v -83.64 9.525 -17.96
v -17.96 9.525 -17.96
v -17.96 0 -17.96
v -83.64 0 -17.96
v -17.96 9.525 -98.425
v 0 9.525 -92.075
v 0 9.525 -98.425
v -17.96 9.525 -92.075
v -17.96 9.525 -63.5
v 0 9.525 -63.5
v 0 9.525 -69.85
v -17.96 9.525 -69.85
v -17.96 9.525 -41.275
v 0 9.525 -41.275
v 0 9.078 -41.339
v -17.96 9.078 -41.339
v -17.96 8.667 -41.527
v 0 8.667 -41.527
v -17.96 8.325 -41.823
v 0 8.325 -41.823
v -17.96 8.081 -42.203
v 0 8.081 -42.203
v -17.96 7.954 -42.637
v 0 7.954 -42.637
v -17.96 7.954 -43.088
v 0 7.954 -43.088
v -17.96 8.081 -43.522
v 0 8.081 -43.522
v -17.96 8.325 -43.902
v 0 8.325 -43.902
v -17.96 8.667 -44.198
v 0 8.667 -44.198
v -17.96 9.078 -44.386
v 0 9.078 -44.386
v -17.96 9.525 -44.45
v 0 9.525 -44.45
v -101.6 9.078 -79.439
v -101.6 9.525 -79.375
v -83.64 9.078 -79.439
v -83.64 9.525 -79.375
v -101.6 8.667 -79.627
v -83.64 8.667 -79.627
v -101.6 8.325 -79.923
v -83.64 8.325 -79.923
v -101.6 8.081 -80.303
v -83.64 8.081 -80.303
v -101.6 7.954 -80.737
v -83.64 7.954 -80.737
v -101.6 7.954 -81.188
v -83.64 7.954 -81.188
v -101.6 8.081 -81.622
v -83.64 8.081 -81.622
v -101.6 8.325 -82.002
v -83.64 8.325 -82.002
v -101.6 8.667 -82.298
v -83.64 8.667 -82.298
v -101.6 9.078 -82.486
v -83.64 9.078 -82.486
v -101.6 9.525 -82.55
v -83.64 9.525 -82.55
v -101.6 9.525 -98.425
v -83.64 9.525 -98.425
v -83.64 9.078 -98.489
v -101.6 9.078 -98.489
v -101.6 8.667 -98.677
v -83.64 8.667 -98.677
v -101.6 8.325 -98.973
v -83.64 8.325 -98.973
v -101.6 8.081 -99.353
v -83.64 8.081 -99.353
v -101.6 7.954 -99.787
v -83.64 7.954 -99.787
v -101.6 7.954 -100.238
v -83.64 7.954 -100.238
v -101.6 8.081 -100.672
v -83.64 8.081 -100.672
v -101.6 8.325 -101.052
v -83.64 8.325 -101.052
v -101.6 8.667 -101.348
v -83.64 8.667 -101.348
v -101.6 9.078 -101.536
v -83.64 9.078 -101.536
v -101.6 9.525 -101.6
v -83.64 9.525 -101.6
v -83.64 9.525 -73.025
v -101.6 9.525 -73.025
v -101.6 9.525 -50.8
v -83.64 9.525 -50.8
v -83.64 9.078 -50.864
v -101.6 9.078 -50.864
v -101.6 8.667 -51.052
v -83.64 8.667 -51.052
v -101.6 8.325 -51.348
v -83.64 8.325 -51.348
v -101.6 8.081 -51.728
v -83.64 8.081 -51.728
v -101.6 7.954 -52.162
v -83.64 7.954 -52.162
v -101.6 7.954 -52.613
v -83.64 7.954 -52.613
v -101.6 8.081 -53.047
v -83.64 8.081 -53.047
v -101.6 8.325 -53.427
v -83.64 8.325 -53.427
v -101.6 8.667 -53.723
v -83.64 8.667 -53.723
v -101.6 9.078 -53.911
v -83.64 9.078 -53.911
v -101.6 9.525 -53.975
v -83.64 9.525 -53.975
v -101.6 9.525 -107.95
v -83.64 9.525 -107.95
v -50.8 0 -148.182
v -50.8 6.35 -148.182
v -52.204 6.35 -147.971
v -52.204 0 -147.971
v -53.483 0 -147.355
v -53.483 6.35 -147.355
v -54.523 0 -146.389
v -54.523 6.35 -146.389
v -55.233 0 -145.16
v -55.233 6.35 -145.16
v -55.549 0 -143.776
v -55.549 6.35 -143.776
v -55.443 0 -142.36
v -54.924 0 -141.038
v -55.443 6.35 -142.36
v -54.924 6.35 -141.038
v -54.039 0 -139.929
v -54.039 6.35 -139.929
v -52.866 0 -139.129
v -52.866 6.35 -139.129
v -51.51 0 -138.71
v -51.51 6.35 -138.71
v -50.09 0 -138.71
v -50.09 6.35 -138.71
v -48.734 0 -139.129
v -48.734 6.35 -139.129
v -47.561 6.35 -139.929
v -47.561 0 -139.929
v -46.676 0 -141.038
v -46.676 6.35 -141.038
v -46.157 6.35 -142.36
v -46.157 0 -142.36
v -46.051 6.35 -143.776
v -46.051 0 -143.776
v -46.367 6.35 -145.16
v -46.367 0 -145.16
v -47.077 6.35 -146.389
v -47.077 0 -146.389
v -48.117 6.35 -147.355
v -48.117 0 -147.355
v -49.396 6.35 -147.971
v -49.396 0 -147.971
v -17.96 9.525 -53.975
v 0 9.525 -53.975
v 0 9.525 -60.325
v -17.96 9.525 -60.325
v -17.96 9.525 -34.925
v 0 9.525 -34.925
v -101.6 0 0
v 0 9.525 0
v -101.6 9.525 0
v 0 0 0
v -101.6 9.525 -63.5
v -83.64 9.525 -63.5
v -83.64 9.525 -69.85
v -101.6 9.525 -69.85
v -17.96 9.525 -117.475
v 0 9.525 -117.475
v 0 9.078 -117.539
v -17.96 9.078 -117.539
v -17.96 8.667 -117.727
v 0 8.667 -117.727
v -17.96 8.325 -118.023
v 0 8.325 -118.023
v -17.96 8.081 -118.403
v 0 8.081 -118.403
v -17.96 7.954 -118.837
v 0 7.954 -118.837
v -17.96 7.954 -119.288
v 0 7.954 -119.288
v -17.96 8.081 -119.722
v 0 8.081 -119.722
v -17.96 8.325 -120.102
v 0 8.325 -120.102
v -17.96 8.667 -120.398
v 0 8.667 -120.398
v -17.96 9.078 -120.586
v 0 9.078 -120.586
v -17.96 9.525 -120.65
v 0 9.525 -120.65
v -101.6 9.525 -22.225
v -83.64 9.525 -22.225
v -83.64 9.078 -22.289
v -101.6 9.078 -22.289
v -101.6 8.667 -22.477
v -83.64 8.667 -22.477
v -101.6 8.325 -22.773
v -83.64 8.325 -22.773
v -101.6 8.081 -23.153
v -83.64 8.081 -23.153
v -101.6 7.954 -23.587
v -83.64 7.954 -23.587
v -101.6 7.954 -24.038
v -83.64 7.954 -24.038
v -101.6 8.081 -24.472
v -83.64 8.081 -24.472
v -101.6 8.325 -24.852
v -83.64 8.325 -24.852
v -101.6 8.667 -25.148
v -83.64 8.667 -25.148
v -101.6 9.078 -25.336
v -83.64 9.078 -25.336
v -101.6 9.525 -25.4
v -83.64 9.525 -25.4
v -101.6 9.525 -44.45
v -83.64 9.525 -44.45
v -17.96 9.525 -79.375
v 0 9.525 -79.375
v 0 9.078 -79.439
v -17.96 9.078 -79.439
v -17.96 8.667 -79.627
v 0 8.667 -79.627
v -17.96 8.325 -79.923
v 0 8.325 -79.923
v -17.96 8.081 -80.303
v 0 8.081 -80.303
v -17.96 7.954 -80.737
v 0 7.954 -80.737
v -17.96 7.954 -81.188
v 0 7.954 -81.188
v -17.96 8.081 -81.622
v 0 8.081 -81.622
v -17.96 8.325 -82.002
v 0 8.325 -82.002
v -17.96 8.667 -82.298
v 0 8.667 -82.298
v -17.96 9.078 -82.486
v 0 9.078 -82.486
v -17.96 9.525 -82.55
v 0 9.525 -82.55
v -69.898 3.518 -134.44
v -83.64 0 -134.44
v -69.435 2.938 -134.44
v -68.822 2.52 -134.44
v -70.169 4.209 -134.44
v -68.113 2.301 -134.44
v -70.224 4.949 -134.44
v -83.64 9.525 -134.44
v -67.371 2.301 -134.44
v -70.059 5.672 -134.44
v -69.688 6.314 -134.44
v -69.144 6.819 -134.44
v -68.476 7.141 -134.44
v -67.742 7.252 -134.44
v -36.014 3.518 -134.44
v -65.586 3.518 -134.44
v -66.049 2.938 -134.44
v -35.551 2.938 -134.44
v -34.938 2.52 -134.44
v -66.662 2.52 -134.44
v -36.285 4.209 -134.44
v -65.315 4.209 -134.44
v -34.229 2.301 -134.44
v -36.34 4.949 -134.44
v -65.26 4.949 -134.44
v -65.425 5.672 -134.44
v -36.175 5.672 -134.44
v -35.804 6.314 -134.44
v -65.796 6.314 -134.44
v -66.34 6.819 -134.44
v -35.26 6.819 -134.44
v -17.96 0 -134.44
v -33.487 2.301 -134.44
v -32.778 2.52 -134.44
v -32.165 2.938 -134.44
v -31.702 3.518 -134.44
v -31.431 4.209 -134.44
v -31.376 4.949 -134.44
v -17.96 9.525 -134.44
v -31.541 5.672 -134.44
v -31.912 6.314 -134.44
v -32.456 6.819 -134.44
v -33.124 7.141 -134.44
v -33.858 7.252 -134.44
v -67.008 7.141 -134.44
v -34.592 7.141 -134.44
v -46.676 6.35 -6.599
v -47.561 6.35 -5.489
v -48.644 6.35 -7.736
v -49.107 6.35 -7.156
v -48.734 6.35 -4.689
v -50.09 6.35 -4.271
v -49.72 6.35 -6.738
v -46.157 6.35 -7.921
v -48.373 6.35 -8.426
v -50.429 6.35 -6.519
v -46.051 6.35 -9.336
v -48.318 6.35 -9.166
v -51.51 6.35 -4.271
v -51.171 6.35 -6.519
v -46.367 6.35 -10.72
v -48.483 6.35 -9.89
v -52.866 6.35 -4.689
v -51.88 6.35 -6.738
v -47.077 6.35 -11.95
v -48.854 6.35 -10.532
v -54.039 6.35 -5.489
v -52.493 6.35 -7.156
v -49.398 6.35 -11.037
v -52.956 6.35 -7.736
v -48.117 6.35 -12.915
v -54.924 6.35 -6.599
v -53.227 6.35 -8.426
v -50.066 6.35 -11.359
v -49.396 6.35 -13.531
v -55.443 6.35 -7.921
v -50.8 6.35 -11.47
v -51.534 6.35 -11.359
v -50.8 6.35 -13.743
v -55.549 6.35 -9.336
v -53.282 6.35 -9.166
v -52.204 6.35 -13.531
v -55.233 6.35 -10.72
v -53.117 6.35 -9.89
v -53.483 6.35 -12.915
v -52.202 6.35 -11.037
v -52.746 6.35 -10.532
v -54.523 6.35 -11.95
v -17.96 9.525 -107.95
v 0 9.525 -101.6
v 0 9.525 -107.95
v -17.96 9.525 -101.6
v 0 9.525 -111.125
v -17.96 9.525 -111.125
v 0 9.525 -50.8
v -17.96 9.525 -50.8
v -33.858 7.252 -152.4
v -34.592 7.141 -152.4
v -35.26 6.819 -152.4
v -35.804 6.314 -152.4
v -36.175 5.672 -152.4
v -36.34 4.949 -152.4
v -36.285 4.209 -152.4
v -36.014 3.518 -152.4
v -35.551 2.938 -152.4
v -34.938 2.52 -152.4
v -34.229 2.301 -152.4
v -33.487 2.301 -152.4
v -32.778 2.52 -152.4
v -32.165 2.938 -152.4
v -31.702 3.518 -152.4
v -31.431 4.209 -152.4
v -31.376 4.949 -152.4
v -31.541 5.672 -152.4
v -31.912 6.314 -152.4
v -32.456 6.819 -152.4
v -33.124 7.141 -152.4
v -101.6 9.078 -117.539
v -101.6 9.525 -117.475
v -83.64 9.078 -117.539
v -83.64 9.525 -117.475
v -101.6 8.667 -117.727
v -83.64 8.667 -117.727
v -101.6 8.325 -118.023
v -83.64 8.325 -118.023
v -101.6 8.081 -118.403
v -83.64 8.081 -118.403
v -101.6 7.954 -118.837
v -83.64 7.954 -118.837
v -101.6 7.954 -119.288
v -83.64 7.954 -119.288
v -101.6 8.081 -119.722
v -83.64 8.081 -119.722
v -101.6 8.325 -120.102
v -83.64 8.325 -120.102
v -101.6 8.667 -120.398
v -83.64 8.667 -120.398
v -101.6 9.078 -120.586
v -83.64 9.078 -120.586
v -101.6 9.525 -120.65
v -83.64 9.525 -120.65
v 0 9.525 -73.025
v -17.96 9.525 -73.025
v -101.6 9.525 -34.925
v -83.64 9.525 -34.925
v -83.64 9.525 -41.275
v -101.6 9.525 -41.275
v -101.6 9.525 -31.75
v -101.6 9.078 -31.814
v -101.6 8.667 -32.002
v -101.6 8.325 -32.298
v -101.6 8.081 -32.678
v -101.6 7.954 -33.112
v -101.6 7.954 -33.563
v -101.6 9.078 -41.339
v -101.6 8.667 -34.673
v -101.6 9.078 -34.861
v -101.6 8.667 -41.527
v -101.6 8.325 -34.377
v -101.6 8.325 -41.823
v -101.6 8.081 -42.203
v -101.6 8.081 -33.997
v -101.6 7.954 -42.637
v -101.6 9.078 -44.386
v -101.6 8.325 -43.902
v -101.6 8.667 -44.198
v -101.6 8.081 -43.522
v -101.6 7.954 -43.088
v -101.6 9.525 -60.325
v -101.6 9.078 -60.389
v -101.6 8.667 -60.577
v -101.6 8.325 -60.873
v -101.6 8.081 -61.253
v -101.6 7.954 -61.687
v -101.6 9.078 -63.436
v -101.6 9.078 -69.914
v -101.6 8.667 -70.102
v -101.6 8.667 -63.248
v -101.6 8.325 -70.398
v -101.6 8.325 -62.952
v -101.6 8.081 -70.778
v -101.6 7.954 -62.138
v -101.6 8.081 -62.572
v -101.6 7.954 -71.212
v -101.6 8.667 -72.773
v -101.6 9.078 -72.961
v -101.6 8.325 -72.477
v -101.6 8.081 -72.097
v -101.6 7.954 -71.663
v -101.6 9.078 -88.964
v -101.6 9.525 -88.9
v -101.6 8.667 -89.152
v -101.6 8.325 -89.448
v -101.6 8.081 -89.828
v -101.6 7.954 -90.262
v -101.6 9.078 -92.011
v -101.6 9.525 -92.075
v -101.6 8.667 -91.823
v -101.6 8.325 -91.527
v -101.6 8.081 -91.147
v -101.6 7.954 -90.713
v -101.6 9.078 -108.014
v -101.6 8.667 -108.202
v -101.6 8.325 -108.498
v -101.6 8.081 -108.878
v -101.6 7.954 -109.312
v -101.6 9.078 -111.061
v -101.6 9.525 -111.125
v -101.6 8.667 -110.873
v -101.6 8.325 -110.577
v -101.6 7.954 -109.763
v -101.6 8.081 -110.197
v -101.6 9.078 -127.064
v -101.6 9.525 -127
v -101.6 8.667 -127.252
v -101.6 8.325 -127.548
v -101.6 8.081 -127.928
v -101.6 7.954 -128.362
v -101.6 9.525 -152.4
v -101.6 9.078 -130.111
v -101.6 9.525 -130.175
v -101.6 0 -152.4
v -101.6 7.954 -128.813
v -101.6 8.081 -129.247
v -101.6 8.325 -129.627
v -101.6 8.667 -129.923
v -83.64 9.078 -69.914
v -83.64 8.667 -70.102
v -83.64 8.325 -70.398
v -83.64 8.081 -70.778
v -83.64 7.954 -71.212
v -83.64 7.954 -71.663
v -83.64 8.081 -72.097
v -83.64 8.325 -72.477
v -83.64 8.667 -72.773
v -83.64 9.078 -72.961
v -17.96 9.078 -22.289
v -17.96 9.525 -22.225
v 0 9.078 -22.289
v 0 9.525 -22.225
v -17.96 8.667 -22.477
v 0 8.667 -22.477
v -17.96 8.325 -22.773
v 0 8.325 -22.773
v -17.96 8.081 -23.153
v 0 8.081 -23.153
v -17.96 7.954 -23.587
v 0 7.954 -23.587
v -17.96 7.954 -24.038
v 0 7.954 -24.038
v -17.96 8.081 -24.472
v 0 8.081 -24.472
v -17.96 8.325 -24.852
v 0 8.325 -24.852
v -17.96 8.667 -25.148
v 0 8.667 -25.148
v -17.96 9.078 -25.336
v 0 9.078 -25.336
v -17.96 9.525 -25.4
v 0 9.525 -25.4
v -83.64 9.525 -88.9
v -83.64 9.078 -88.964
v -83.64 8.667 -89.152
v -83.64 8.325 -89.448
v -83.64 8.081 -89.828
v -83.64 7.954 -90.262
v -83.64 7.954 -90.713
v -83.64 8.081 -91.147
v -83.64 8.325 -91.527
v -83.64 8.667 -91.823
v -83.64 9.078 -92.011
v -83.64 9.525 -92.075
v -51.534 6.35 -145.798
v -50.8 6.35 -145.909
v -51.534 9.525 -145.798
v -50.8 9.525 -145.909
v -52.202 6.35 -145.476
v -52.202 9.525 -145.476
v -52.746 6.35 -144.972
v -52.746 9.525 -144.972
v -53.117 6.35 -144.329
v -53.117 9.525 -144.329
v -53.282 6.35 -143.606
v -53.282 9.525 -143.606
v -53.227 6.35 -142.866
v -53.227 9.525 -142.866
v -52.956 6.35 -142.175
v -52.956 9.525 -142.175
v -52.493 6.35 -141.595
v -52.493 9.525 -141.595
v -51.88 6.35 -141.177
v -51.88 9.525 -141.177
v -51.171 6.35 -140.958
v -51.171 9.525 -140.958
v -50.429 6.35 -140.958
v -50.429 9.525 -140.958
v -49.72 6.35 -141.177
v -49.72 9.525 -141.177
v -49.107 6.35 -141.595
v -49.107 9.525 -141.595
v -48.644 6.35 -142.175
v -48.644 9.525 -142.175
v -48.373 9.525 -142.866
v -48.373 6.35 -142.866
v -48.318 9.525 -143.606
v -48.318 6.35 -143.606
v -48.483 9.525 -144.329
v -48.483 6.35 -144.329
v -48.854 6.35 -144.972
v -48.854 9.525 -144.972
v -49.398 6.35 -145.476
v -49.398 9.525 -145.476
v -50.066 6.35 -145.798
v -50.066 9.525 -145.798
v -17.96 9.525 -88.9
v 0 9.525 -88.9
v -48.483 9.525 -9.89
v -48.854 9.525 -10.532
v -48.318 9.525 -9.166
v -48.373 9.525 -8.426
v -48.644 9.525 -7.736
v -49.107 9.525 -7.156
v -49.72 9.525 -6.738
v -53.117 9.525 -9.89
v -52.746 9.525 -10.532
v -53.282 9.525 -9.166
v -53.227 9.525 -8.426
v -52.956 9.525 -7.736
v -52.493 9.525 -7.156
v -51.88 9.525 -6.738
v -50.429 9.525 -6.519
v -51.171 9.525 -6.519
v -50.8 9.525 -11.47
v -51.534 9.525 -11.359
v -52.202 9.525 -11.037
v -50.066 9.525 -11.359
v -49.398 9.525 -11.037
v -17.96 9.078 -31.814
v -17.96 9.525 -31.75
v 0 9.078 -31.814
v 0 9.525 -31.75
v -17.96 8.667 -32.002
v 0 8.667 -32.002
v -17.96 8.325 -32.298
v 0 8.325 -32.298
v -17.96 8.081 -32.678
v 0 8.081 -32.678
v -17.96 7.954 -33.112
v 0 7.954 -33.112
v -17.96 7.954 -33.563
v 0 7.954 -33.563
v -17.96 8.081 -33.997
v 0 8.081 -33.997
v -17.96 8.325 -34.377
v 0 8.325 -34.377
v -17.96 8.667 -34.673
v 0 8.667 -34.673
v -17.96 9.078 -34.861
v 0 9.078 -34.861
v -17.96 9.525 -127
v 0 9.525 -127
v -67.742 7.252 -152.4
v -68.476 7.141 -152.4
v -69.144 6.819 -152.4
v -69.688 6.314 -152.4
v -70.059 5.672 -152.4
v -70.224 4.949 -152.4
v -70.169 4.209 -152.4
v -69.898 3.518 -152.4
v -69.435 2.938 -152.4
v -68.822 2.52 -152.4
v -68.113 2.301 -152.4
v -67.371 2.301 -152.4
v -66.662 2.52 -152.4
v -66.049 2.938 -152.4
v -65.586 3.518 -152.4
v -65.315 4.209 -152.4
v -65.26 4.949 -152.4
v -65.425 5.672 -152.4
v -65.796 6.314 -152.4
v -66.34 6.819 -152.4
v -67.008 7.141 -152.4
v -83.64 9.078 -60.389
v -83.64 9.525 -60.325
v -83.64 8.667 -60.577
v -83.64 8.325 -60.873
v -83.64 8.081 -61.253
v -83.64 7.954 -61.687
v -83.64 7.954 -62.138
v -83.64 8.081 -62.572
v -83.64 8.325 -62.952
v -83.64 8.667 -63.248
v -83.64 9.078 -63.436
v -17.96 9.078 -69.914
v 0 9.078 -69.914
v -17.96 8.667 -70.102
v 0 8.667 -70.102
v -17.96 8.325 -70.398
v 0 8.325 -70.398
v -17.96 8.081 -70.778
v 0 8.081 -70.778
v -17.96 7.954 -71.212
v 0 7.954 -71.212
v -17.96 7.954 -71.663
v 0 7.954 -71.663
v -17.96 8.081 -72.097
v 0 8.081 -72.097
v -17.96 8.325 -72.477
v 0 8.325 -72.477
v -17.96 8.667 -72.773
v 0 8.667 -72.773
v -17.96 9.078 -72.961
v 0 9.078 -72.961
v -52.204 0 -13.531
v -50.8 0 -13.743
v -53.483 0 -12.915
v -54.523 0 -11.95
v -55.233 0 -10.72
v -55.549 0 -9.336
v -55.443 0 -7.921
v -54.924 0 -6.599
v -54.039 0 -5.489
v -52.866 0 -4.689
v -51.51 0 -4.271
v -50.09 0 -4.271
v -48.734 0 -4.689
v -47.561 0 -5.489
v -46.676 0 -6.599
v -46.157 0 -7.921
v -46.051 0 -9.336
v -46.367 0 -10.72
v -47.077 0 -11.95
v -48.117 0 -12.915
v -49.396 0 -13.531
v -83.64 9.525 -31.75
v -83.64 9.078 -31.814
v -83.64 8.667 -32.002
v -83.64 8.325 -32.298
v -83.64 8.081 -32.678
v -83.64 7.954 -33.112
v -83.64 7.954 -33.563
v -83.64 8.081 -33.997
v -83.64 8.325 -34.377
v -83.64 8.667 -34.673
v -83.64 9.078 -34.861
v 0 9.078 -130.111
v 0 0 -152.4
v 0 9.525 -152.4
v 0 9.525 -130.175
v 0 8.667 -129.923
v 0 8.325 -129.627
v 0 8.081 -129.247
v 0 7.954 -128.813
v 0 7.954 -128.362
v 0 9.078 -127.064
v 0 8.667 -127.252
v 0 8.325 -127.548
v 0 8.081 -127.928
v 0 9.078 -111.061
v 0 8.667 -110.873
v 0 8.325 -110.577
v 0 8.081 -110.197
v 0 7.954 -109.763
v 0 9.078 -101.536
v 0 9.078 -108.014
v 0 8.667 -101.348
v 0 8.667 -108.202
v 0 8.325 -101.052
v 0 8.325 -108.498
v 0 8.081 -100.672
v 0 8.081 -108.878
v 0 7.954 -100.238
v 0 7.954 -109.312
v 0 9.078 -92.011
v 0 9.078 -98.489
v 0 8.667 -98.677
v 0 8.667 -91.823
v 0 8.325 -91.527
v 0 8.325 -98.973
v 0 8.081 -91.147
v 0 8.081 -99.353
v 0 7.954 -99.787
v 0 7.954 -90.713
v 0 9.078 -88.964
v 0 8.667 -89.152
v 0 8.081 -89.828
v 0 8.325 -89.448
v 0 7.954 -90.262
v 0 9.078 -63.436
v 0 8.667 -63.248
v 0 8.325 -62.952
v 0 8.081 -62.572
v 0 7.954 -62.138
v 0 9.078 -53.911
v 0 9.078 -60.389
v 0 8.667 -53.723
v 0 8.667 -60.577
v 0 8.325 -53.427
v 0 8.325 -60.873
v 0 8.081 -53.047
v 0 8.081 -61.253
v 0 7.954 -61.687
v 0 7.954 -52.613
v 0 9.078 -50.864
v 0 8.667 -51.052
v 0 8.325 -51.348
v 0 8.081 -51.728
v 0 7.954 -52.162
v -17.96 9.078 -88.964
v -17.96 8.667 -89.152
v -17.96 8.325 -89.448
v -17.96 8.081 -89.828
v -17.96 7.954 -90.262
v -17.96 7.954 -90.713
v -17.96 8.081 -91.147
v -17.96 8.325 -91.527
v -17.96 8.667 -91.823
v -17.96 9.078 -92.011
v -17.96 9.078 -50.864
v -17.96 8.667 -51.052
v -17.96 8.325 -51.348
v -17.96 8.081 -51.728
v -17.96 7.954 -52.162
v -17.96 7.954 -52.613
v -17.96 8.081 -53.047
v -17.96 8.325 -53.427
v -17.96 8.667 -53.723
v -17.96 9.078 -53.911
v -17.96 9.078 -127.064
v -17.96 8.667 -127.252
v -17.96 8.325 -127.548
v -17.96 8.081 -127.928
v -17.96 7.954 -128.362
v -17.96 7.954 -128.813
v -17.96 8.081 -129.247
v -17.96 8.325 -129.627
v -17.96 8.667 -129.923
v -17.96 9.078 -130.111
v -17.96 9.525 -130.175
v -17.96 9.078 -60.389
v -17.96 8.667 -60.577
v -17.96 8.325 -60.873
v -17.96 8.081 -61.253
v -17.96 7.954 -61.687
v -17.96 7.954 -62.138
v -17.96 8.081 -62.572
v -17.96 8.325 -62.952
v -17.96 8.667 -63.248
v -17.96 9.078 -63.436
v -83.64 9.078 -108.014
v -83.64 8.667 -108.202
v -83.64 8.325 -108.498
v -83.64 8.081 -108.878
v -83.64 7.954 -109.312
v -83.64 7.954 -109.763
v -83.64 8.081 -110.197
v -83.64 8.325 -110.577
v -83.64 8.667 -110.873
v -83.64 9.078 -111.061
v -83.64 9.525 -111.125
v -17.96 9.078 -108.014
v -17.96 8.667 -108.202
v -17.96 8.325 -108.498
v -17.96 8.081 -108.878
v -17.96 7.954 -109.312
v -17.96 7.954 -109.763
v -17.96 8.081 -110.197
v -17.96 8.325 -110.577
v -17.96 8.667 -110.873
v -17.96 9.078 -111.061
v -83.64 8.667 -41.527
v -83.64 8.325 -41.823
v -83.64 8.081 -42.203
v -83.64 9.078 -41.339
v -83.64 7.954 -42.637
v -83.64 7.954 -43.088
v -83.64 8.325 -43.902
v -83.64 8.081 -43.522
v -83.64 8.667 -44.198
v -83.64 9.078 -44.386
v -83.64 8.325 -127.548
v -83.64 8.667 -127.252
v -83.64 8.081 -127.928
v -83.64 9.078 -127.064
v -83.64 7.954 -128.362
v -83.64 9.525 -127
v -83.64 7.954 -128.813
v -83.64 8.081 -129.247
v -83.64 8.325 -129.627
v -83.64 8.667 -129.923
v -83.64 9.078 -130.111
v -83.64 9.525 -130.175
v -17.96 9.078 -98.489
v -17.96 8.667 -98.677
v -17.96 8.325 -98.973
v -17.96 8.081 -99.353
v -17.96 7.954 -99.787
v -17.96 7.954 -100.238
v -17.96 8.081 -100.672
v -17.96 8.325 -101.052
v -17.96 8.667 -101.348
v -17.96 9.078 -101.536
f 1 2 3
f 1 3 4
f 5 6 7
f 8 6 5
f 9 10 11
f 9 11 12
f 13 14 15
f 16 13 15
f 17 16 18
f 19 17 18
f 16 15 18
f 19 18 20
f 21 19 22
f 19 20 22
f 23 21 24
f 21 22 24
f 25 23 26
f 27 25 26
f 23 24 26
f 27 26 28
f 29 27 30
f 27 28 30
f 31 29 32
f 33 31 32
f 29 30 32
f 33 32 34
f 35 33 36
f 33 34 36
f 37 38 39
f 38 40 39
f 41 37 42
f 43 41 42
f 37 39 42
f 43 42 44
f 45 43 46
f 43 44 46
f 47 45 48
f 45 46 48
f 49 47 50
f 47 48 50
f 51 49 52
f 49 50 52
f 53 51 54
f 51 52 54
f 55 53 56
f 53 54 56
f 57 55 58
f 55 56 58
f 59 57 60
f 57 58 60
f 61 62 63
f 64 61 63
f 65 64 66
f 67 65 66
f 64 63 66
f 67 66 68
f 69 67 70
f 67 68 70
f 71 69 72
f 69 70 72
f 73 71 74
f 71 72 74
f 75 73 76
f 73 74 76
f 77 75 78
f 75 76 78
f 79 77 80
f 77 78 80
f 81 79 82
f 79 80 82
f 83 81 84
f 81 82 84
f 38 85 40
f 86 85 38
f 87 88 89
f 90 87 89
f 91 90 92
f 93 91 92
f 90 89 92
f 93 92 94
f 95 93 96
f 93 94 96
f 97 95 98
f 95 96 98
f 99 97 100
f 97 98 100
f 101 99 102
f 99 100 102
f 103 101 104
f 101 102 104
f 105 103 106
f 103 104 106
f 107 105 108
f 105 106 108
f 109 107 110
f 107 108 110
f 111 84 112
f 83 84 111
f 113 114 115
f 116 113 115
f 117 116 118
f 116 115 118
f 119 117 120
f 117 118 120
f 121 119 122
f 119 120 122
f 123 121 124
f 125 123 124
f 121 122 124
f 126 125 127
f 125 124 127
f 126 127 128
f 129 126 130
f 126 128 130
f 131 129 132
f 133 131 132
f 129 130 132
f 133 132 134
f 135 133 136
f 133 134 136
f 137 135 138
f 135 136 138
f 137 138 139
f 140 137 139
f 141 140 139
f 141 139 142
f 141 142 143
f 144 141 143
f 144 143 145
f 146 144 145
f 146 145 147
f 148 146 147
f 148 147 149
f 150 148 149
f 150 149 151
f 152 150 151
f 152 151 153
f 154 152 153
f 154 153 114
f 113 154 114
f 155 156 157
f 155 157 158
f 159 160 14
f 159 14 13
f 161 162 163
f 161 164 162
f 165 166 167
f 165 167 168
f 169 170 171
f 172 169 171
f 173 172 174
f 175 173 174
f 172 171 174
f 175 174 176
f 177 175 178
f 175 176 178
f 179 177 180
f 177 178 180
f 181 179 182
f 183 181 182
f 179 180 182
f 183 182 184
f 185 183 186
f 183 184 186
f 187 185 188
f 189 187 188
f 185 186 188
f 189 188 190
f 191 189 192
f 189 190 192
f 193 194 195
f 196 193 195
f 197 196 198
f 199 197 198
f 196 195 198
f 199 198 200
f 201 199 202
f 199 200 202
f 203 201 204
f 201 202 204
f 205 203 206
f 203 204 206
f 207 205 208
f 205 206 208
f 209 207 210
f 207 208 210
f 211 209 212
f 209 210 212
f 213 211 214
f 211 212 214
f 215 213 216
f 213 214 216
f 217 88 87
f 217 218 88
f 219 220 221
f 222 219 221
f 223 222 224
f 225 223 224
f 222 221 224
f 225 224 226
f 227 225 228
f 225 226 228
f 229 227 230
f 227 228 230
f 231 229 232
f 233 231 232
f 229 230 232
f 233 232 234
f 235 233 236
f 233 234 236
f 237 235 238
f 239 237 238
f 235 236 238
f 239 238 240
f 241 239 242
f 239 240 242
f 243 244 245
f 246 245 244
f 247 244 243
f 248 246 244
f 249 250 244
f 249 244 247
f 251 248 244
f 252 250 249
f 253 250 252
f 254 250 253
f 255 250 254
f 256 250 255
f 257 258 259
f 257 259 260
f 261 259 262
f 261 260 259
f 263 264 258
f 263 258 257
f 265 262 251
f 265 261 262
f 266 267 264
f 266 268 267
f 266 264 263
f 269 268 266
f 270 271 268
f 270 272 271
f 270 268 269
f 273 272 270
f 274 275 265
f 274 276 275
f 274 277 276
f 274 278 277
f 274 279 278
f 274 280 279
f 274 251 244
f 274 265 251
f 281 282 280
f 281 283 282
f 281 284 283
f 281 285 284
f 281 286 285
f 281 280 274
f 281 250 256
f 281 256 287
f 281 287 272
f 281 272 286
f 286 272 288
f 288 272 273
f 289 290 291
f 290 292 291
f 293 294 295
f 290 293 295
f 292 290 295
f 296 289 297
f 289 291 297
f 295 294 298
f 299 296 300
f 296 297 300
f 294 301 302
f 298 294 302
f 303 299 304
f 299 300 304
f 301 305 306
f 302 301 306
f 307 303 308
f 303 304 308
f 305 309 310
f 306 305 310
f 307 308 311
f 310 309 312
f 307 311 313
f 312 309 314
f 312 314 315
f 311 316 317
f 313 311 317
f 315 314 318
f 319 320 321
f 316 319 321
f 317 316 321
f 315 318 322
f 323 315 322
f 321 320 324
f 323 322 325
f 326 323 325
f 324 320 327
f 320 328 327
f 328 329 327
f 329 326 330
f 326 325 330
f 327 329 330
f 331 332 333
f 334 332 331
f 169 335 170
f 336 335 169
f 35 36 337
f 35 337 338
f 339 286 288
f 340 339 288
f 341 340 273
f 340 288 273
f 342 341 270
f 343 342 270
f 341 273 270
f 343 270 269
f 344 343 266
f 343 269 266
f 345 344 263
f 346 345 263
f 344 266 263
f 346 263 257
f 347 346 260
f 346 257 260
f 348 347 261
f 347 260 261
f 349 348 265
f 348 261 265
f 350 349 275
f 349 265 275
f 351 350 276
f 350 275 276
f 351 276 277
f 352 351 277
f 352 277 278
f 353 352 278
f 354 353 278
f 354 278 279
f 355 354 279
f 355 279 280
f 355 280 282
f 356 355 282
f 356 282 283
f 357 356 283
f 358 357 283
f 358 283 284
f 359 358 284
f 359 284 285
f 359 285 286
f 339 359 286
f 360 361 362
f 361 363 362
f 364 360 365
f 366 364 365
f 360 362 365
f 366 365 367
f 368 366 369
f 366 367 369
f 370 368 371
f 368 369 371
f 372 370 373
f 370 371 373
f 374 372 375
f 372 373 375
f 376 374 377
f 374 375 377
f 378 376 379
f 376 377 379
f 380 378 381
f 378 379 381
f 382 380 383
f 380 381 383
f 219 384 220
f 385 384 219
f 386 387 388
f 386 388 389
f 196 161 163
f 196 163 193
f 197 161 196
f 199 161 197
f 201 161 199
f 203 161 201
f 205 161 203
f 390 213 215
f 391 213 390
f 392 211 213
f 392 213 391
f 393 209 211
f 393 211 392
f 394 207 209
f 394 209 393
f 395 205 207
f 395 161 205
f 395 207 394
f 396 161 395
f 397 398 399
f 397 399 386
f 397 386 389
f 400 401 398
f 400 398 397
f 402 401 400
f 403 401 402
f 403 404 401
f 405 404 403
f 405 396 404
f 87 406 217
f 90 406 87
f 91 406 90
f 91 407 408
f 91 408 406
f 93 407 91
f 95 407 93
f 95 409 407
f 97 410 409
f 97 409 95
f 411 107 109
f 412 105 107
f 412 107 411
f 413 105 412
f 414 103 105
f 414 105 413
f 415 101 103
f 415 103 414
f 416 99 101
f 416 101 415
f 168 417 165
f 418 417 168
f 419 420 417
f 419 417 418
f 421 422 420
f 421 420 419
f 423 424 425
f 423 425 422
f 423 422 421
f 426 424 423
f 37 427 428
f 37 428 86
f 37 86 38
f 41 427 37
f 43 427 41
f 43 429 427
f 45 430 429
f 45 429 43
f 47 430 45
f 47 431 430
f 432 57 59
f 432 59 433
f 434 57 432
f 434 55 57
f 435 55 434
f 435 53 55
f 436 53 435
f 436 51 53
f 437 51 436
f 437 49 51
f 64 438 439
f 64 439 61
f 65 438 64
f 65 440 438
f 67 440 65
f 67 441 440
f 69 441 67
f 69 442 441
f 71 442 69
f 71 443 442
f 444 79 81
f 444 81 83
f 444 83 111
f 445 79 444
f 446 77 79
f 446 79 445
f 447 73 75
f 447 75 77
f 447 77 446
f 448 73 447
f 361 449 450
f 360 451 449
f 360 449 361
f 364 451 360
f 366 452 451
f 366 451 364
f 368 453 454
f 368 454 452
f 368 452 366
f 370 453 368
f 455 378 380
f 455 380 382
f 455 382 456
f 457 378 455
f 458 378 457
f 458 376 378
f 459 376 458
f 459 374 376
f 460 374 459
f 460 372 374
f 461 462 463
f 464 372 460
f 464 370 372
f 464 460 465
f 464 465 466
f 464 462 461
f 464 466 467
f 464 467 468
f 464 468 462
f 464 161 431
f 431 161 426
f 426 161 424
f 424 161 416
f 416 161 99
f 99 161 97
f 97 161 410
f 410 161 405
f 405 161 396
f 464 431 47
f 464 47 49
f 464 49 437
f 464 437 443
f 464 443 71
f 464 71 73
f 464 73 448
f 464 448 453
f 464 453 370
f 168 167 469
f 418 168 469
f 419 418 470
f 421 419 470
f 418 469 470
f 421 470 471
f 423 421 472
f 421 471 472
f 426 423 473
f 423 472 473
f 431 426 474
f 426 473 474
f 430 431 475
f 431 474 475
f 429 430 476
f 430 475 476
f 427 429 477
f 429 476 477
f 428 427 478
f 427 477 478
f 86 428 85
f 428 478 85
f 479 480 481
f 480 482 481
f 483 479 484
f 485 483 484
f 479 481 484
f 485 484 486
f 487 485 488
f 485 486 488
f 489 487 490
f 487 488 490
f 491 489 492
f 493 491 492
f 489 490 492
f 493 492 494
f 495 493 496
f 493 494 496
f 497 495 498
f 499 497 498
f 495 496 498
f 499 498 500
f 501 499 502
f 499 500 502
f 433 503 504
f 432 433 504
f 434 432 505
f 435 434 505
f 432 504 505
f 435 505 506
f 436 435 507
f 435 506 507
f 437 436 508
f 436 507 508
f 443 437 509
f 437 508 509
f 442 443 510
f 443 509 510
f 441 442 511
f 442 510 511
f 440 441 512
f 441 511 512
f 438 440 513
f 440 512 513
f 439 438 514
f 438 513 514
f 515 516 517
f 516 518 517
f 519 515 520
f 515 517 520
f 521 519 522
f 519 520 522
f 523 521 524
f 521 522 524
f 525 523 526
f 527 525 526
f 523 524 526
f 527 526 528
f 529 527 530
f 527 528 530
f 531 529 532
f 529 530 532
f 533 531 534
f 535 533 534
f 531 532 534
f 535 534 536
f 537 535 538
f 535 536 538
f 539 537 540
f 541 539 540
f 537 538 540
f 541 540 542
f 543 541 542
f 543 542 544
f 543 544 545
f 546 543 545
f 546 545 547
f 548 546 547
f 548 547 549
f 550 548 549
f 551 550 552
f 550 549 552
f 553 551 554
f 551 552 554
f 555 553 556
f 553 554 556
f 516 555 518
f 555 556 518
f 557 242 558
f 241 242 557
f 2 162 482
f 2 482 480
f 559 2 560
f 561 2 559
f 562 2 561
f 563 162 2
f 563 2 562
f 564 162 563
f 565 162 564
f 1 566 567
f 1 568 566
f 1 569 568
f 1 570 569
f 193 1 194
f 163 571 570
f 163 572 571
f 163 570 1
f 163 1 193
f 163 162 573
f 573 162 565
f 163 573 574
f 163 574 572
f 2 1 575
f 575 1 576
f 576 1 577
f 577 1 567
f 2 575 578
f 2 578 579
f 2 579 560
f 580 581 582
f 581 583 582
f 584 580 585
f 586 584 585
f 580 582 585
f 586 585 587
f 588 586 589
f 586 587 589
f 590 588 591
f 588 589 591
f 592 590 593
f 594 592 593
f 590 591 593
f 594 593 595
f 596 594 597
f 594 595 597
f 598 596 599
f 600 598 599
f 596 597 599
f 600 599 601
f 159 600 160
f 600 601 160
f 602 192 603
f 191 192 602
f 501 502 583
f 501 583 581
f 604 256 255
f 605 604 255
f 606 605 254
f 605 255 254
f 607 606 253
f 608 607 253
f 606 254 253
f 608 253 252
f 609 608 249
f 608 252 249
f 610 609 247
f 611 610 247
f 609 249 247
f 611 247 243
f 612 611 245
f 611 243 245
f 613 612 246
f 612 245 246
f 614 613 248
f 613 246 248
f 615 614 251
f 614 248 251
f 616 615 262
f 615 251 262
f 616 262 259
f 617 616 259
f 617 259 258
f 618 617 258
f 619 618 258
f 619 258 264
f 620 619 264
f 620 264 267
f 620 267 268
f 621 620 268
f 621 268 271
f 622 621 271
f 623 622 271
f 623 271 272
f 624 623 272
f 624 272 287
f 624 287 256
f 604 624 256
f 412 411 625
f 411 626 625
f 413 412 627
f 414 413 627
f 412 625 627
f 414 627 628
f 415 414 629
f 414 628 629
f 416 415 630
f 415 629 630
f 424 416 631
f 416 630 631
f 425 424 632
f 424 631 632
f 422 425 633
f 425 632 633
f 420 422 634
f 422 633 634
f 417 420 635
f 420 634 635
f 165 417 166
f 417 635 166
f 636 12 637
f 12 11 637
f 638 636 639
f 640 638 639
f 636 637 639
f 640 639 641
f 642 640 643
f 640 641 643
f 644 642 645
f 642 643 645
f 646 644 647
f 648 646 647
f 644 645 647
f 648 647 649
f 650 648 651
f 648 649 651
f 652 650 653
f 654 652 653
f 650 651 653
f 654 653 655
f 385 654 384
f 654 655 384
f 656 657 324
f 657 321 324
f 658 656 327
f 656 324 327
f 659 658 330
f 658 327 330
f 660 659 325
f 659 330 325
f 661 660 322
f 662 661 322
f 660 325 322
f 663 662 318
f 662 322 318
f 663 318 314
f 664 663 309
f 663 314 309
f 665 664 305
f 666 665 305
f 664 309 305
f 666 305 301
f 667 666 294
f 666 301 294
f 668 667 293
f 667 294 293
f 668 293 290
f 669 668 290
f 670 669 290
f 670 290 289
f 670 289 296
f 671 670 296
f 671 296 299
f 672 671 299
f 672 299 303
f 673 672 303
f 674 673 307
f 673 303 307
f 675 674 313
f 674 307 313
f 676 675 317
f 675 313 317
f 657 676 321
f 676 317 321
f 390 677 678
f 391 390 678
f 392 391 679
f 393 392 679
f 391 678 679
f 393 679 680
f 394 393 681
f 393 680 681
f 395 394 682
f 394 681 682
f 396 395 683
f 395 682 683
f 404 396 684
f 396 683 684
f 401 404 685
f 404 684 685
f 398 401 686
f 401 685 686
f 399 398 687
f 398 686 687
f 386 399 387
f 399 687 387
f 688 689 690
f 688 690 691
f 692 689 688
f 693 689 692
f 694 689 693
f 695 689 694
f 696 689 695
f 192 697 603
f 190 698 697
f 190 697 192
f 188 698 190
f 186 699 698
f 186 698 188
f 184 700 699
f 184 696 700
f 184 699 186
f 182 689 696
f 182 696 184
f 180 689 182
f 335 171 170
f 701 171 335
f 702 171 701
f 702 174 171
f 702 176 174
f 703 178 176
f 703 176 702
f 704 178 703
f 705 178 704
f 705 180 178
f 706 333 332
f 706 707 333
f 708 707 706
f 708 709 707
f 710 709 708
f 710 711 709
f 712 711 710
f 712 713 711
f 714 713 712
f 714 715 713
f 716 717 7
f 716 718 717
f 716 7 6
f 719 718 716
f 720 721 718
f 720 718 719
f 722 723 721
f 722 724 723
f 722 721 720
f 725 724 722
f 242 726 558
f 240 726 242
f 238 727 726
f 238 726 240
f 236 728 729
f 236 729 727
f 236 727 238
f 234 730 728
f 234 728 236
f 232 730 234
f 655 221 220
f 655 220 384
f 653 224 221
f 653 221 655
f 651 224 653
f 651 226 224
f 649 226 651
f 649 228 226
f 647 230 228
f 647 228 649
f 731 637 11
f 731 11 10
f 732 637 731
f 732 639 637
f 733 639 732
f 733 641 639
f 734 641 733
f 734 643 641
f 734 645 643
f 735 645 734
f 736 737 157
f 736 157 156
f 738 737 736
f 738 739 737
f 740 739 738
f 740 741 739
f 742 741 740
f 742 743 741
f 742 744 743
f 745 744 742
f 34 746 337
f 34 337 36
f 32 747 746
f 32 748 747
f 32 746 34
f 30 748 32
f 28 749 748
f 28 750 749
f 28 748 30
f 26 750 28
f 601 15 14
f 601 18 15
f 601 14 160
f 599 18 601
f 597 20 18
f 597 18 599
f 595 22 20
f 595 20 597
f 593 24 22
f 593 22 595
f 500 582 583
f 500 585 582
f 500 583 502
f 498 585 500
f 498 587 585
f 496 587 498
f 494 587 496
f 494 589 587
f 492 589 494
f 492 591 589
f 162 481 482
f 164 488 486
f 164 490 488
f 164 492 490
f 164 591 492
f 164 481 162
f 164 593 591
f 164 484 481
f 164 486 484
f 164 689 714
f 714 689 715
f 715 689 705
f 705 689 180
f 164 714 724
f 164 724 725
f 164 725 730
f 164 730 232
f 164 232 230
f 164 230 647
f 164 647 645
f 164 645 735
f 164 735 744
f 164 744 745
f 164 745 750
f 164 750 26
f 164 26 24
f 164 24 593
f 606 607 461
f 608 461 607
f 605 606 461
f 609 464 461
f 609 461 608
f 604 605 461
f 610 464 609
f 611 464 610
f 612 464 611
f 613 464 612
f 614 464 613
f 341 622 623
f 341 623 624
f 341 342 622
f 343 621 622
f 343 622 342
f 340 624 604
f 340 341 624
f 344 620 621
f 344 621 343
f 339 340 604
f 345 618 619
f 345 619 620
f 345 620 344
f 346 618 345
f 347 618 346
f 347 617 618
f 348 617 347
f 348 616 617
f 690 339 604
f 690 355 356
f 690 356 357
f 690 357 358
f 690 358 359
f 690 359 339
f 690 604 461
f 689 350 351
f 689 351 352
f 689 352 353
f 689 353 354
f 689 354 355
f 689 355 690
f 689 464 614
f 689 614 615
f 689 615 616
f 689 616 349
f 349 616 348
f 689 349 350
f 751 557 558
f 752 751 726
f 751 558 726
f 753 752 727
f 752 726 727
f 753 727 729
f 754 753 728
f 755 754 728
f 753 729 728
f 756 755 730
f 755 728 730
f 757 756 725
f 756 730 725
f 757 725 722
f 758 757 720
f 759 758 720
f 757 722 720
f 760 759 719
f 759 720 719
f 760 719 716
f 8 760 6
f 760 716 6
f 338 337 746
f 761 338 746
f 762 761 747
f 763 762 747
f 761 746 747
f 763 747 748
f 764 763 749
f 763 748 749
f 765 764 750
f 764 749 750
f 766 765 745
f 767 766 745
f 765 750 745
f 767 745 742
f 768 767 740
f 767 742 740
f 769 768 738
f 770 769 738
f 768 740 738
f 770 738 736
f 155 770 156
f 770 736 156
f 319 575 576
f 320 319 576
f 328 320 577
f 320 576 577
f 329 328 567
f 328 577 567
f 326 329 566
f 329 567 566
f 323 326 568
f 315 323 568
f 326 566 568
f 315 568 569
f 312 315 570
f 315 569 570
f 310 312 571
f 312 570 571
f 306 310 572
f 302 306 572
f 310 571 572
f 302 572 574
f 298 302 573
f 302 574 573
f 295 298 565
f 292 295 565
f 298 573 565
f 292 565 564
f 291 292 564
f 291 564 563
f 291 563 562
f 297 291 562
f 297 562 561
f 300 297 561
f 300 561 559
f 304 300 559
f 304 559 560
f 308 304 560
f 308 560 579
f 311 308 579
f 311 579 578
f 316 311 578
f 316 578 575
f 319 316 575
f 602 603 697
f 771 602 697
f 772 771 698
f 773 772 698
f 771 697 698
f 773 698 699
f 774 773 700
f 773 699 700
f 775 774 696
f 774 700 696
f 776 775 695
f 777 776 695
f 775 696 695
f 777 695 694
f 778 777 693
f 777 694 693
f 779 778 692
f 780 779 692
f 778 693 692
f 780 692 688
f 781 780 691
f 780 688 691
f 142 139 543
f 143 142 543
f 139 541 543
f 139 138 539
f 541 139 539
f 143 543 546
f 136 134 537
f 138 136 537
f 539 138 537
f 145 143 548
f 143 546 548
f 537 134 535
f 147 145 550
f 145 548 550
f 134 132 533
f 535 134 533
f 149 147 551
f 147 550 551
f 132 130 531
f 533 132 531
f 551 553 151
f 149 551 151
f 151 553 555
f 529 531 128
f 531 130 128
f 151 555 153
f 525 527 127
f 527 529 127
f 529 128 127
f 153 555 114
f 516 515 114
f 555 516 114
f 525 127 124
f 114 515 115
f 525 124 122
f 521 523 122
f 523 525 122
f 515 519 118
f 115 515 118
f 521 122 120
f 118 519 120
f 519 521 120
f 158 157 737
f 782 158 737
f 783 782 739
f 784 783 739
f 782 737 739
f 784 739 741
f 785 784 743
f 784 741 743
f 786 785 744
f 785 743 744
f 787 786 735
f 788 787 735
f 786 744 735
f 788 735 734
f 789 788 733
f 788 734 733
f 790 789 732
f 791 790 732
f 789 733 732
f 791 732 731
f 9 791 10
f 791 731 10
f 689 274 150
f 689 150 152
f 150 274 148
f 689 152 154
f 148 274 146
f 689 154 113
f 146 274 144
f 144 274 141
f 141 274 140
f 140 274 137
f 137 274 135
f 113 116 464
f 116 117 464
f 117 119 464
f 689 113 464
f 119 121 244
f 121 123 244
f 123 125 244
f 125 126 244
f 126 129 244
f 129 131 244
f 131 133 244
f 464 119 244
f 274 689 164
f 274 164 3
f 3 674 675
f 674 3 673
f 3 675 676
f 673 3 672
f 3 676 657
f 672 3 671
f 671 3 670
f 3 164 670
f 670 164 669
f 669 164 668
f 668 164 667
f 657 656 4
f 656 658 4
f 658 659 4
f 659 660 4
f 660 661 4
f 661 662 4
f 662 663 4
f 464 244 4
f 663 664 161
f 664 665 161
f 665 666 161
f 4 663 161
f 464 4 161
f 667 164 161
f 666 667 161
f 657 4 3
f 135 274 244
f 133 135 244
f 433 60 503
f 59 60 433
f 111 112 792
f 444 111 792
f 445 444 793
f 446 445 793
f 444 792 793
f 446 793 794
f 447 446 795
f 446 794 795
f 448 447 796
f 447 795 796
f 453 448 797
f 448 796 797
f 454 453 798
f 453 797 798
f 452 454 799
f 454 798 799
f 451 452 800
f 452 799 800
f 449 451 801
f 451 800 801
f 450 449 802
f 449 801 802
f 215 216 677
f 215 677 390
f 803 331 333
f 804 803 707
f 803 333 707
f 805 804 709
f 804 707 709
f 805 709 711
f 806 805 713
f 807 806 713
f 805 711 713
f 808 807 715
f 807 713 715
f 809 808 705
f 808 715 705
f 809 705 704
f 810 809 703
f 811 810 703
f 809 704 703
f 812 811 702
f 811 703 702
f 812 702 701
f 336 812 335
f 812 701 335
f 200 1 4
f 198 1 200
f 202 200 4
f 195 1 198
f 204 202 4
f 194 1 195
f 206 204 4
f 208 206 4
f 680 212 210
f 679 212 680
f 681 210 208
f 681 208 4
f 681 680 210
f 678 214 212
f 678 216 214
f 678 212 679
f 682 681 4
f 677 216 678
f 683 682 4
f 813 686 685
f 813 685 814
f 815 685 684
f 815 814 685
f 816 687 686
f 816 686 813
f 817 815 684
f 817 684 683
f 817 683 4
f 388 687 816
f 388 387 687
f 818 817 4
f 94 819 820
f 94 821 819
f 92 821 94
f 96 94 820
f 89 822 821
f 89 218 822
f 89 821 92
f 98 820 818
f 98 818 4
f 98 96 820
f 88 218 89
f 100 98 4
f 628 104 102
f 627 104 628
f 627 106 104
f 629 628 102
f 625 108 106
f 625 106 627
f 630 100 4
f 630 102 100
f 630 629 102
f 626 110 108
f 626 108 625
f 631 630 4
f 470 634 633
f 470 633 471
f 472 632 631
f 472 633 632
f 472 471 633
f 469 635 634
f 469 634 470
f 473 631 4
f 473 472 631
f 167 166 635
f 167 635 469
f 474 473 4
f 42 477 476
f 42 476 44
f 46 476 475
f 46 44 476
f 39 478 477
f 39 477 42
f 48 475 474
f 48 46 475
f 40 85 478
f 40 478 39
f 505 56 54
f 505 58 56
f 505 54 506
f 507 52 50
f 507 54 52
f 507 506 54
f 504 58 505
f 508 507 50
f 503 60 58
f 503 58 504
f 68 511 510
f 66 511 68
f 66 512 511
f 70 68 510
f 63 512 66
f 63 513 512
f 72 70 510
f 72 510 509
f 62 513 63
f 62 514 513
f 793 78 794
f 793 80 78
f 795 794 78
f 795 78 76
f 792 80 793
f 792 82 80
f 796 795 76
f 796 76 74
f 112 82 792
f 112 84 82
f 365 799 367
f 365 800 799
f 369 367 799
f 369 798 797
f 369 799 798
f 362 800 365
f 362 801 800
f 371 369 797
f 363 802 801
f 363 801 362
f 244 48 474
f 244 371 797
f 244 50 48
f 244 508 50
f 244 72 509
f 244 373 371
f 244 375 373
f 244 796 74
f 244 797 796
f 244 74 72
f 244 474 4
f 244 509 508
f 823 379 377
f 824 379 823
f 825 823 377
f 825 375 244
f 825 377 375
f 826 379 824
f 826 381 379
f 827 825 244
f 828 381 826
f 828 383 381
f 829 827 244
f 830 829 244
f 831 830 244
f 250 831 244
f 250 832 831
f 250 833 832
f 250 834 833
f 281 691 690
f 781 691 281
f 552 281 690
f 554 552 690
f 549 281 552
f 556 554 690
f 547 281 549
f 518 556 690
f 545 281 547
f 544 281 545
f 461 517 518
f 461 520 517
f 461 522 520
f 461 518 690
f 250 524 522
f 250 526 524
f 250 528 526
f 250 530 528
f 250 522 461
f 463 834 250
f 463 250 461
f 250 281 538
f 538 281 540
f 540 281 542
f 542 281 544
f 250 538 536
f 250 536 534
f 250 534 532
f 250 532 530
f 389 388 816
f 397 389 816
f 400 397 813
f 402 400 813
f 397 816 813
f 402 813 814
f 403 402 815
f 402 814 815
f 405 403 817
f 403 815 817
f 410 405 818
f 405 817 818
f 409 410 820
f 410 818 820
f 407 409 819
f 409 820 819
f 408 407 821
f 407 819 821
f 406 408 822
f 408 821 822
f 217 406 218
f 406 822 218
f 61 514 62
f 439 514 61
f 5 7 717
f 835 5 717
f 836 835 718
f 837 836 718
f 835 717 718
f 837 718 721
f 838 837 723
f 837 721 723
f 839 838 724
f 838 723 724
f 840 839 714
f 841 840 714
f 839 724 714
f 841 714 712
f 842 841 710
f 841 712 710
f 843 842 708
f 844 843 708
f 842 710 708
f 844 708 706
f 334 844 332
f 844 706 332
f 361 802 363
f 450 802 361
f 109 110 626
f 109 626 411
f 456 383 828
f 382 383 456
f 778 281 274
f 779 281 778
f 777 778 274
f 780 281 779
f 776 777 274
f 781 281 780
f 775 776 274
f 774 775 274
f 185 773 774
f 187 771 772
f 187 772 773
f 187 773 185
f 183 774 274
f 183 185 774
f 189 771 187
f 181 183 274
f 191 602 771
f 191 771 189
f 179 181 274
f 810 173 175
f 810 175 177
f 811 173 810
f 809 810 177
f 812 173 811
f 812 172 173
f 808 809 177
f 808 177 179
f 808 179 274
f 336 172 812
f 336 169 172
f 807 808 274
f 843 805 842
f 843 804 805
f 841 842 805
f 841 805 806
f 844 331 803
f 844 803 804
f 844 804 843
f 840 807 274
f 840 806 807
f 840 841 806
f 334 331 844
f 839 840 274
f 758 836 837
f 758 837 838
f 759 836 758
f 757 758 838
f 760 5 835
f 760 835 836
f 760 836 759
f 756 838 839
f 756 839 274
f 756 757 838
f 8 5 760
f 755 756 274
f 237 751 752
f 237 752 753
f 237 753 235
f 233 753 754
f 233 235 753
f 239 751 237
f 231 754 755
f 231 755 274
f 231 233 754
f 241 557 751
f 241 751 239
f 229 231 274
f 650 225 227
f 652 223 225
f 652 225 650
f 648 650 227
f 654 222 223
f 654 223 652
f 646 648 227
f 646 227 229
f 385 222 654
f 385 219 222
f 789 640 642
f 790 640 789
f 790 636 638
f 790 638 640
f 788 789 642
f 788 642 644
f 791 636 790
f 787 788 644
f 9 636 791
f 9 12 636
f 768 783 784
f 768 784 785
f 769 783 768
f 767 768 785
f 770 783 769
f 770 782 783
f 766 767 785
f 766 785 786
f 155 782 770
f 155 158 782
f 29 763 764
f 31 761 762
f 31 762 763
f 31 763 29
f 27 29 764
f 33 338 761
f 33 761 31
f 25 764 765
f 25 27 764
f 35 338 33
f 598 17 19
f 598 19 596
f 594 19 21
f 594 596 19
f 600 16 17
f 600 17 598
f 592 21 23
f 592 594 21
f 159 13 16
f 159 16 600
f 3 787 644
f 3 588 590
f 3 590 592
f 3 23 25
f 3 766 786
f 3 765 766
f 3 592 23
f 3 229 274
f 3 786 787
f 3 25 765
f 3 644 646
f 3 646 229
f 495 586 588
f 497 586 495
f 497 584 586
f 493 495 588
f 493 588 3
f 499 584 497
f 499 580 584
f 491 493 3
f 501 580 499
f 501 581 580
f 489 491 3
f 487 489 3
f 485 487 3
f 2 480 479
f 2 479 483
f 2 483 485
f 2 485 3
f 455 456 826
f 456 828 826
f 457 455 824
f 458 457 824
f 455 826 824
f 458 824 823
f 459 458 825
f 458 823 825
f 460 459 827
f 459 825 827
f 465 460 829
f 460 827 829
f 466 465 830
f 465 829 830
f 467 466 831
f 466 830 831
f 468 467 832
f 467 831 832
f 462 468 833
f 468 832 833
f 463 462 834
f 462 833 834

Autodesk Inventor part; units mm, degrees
ref_plane "YZ Plane" through (0, 0, 0) normal (1, 0, 0) x (0, 1, 0)
ref_plane "XZ Plane" through (0, 0, 0) normal (0, 1, 0) x (-1, 0, 0)
ref_plane "XY Plane" through (0, 0, 0) normal (0, 0, 1) x (1, 0, 0)
sketch "Sketch1" plane through (0, 0, 0) normal (0, 1, 0) x (-1, 0, 0)
  line L0 (0, 0) -> (101.6, 0)
  line L1 (101.6, 0) -> (101.6, -152.4)
  line L2 (101.6, -152.4) -> (0, -152.4)
  line L3 (0, -152.4) -> (0, 0)
  dimension "d0" = 101.6
  dimension "d1" = 152.4
extrude "Extrusion1" add sketch "Sketch1" along normal blind 9.525
sketch "Sketch2" plane through (0, 9.525, 0) normal (0, 1, 0) x (1, 0, 0)
  line L0 (-101.6, 0) -> (0, 0) projected
  line L1 (0, 0) -> (-17.9605, 17.9605)
  line L2 (0, 0) -> (25.4, 0) construction
  line L3 (-101.6, 152.4) -> (-101.6, 0) projected
  line L4 (-101.6, 152.4) -> (-83.6395, 134.4395)
  line L5 (-17.9605, 17.9605) -> (-83.6395, 17.9605)
  line L6 (-83.6395, 17.9605) -> (-83.6395, 134.4395)
  line L7 (-83.6395, 134.4395) -> (-17.9605, 134.4395)
  line L8 (-17.9605, 134.4395) -> (-17.9605, 17.9605)
  dimension "d4" = 25.4
  dimension "d5" = 135
  dimension "d6" = 25.4
extrude "Extrusion2" cut sketch "Sketch2" against normal blind 9.525 contours L5 L6 L7 L8
sketch "Sketch3" plane through (0, 0, 0) normal (1, 0, 0) x (0, 0, -1)
  line L0 (0, 9.525) -> (152.4, 9.525) projected
  line L1 (0, 10.079) -> (25.4, 10.079) construction
  line L2 (0, 0) -> (0, 9.525) projected
  line L3 (0, 9.525) -> (23.8125, 9.525)
  line L4 (134.4395, 9.525) -> (17.9605, 9.525) projected
  circle A0 centre (23.8125, 9.525) radius 1.5875
  circle A1 centre (33.3375, 9.525) radius 1.5875
  circle A2 centre (42.8625, 9.525) radius 1.5875
  circle A3 centre (52.3875, 9.525) radius 1.5875
  circle A4 centre (61.9125, 9.525) radius 1.5875
  circle A5 centre (71.4375, 9.525) radius 1.5875
  circle A6 centre (80.9625, 9.525) radius 1.5875
  circle A7 centre (90.4875, 9.525) radius 1.5875
  circle A8 centre (100.0125, 9.525) radius 1.5875
  circle A9 centre (109.5375, 9.525) radius 1.5875
  circle A10 centre (119.0625, 9.525) radius 1.5875
  circle A11 centre (128.5875, 9.525) radius 1.5875
  point P0 (130.175, 9.525)
  point P1 (127, 9.525)
  point P2 (120.65, 9.525)
  point P3 (117.475, 9.525)
  point P4 (101.6, 9.525)
  point P5 (98.425, 9.525)
  point P6 (82.55, 9.525)
  point P7 (79.375, 9.525)
  point P8 (73.025, 9.525)
  point P9 (69.85, 9.525)
  point P10 (63.5, 9.525)
  point P11 (60.325, 9.525)
  point P12 (53.975, 9.525)
  point P13 (50.8, 9.525)
  point P14 (44.45, 9.525)
  point P15 (41.275, 9.525)
  point P16 (34.925, 9.525)
  point P17 (31.75, 9.525)
  point P18 (22.225, 9.525)
  point P19 (25.4, 9.525)
  dimension "d11" = 23.8125
  dimension "d12" = 3.175
  dimension "d15" = 9.525
extrude "Extrusion3" cut sketch "Sketch3" against normal blind 107.95 contours L0 A0 | L0 A11 | L0 A10 | A9 L0 | L0 A9 | L0 A8 | A7 L0 | L0 A7 | L0 A6 | L0 A5 | L0 A4 | L0 A3 | L0 A2 | L0 A1 picked at (24.8555, 9.3984) picked at (128.9035, 8.9629) picked at (119.4808, 8.612) picked at (100.4308, 8.612) picked at (81.3808, 8.612) picked at (71.8558, 8.612) picked at (61.501, 9.0475) picked at (52.5145, 8.7843) picked at (42.9895, 8.7843) picked at (33.5251, 8.5384)
sketch "Sketch4" plane through (0, 0, -152.4) normal (0, 0, -1) x (-1, 0, 0)
  line L0 (101.6, 0) -> (101.6, 9.525) projected
  line L1 (101.6, 4.7625) -> (67.7418, 4.7625)
  line L2 (0, 4.7625) -> (33.8582, 4.7625)
  line L3 (0, 4.7625) -> (33.8582, 4.7625) construction
  point P0 (0, 0)
  dimension "d22" = 33.8582
  dimension "d23" = 33.8582
  dimension "d24" = 0
hole "Hole1" at (-67.7418, 4.7625, -152.4) direction (0, 0, 1) diameter 4.9784 depth 25.4 thread size "1/4-20 UNC" class "2B" standard "ANSI Unified Screw Threads"
hole "Hole2" at (-33.8582, 4.7625, -152.4) direction (0, 0, 1) diameter 4.9784 depth 25.4 thread size "1/4-20 UNC" class "2B" standard "ANSI Unified Screw Threads"
sketch "Sketch7" plane through (0, 0, 0) normal (0, -1, 0) x (1, 0, 0)
  line L0 (-101.6, 0) -> (0, 0) projected
  line L1 (-50.8, 0) -> (-50.8, -17.9605)
  line L2 (-83.6395, -17.9605) -> (-17.9605, -17.9605) projected
  line L3 (-50.8, -17.9605) -> (-50.8, -8.9803)
  line L4 (-83.6395, -134.4395) -> (-17.9605, -134.4395) projected
  line L5 (-50.8, -134.4395) -> (-50.8, -152.4)
  line L6 (0, -152.4) -> (-101.6, -152.4) projected
  line L7 (-50.8, -152.4) -> (-50.8, -143.4197)
hole "Hole5" at (-50.8, 0, -8.9803) direction (0, 1, 0) diameter 4.9784 depth 25.4 counterbore diameter 9.525 counterbore depth 6.35 thread size "1/4-20 UNC" class "2B" standard "ANSI Unified Screw Threads"
hole "Hole6" at (-50.8, 0, -143.4197) direction (0, 1, 0) diameter 4.9784 depth 25.4 counterbore diameter 9.525 counterbore depth 6.35 thread size "1/4-20 UNC" class "2B" standard "ANSI Unified Screw Threads"
properties part number "side-B"
